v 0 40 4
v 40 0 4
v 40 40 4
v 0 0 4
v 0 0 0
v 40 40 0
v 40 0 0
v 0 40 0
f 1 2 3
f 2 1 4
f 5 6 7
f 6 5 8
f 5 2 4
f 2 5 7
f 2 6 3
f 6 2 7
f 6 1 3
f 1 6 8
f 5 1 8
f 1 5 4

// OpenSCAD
// ==============================
// PARAMETRY
// ==============================
size = 40;          // bok kwadratu (mm)
thickness = 4;      // grubość płytki (mm)

pattern_pitch = 1.2;   // odległość między punktami (mm)
pyramid_height = 0.4;  // wysokość piramid (mm)
pyramid_size = 0.8;    // szerokość podstawy piramidy (mm)

// ==============================
// MODUŁ PIRAMIDKI
// ==============================
module pyramid(h, base) {
    polyhedron(
        points=[
            [0,0,0],
            [base,0,0],
            [base,base,0],
            [0,base,0],
            [base/2, base/2, h]
        ],
        faces=[
            [0,1,4],
            [1,2,4],
            [2,3,4],
            [3,0,4],
            [0,1,2,3]
        ]
    );
}

// ==============================
// GŁÓWNA PŁYTKA + TEKSTURA
// ==============================
union() {
    // baza
    cube([size, size, thickness]);

    // tekstura (na górze)
    for (x = [0 : pattern_pitch : size - pyramid_size]) {
        for (y = [0 : pattern_pitch : size - pyramid_size]) {

            translate([x, y, thickness])
                pyramid(pyramid_height, pyramid_size);
        }
    }
}
